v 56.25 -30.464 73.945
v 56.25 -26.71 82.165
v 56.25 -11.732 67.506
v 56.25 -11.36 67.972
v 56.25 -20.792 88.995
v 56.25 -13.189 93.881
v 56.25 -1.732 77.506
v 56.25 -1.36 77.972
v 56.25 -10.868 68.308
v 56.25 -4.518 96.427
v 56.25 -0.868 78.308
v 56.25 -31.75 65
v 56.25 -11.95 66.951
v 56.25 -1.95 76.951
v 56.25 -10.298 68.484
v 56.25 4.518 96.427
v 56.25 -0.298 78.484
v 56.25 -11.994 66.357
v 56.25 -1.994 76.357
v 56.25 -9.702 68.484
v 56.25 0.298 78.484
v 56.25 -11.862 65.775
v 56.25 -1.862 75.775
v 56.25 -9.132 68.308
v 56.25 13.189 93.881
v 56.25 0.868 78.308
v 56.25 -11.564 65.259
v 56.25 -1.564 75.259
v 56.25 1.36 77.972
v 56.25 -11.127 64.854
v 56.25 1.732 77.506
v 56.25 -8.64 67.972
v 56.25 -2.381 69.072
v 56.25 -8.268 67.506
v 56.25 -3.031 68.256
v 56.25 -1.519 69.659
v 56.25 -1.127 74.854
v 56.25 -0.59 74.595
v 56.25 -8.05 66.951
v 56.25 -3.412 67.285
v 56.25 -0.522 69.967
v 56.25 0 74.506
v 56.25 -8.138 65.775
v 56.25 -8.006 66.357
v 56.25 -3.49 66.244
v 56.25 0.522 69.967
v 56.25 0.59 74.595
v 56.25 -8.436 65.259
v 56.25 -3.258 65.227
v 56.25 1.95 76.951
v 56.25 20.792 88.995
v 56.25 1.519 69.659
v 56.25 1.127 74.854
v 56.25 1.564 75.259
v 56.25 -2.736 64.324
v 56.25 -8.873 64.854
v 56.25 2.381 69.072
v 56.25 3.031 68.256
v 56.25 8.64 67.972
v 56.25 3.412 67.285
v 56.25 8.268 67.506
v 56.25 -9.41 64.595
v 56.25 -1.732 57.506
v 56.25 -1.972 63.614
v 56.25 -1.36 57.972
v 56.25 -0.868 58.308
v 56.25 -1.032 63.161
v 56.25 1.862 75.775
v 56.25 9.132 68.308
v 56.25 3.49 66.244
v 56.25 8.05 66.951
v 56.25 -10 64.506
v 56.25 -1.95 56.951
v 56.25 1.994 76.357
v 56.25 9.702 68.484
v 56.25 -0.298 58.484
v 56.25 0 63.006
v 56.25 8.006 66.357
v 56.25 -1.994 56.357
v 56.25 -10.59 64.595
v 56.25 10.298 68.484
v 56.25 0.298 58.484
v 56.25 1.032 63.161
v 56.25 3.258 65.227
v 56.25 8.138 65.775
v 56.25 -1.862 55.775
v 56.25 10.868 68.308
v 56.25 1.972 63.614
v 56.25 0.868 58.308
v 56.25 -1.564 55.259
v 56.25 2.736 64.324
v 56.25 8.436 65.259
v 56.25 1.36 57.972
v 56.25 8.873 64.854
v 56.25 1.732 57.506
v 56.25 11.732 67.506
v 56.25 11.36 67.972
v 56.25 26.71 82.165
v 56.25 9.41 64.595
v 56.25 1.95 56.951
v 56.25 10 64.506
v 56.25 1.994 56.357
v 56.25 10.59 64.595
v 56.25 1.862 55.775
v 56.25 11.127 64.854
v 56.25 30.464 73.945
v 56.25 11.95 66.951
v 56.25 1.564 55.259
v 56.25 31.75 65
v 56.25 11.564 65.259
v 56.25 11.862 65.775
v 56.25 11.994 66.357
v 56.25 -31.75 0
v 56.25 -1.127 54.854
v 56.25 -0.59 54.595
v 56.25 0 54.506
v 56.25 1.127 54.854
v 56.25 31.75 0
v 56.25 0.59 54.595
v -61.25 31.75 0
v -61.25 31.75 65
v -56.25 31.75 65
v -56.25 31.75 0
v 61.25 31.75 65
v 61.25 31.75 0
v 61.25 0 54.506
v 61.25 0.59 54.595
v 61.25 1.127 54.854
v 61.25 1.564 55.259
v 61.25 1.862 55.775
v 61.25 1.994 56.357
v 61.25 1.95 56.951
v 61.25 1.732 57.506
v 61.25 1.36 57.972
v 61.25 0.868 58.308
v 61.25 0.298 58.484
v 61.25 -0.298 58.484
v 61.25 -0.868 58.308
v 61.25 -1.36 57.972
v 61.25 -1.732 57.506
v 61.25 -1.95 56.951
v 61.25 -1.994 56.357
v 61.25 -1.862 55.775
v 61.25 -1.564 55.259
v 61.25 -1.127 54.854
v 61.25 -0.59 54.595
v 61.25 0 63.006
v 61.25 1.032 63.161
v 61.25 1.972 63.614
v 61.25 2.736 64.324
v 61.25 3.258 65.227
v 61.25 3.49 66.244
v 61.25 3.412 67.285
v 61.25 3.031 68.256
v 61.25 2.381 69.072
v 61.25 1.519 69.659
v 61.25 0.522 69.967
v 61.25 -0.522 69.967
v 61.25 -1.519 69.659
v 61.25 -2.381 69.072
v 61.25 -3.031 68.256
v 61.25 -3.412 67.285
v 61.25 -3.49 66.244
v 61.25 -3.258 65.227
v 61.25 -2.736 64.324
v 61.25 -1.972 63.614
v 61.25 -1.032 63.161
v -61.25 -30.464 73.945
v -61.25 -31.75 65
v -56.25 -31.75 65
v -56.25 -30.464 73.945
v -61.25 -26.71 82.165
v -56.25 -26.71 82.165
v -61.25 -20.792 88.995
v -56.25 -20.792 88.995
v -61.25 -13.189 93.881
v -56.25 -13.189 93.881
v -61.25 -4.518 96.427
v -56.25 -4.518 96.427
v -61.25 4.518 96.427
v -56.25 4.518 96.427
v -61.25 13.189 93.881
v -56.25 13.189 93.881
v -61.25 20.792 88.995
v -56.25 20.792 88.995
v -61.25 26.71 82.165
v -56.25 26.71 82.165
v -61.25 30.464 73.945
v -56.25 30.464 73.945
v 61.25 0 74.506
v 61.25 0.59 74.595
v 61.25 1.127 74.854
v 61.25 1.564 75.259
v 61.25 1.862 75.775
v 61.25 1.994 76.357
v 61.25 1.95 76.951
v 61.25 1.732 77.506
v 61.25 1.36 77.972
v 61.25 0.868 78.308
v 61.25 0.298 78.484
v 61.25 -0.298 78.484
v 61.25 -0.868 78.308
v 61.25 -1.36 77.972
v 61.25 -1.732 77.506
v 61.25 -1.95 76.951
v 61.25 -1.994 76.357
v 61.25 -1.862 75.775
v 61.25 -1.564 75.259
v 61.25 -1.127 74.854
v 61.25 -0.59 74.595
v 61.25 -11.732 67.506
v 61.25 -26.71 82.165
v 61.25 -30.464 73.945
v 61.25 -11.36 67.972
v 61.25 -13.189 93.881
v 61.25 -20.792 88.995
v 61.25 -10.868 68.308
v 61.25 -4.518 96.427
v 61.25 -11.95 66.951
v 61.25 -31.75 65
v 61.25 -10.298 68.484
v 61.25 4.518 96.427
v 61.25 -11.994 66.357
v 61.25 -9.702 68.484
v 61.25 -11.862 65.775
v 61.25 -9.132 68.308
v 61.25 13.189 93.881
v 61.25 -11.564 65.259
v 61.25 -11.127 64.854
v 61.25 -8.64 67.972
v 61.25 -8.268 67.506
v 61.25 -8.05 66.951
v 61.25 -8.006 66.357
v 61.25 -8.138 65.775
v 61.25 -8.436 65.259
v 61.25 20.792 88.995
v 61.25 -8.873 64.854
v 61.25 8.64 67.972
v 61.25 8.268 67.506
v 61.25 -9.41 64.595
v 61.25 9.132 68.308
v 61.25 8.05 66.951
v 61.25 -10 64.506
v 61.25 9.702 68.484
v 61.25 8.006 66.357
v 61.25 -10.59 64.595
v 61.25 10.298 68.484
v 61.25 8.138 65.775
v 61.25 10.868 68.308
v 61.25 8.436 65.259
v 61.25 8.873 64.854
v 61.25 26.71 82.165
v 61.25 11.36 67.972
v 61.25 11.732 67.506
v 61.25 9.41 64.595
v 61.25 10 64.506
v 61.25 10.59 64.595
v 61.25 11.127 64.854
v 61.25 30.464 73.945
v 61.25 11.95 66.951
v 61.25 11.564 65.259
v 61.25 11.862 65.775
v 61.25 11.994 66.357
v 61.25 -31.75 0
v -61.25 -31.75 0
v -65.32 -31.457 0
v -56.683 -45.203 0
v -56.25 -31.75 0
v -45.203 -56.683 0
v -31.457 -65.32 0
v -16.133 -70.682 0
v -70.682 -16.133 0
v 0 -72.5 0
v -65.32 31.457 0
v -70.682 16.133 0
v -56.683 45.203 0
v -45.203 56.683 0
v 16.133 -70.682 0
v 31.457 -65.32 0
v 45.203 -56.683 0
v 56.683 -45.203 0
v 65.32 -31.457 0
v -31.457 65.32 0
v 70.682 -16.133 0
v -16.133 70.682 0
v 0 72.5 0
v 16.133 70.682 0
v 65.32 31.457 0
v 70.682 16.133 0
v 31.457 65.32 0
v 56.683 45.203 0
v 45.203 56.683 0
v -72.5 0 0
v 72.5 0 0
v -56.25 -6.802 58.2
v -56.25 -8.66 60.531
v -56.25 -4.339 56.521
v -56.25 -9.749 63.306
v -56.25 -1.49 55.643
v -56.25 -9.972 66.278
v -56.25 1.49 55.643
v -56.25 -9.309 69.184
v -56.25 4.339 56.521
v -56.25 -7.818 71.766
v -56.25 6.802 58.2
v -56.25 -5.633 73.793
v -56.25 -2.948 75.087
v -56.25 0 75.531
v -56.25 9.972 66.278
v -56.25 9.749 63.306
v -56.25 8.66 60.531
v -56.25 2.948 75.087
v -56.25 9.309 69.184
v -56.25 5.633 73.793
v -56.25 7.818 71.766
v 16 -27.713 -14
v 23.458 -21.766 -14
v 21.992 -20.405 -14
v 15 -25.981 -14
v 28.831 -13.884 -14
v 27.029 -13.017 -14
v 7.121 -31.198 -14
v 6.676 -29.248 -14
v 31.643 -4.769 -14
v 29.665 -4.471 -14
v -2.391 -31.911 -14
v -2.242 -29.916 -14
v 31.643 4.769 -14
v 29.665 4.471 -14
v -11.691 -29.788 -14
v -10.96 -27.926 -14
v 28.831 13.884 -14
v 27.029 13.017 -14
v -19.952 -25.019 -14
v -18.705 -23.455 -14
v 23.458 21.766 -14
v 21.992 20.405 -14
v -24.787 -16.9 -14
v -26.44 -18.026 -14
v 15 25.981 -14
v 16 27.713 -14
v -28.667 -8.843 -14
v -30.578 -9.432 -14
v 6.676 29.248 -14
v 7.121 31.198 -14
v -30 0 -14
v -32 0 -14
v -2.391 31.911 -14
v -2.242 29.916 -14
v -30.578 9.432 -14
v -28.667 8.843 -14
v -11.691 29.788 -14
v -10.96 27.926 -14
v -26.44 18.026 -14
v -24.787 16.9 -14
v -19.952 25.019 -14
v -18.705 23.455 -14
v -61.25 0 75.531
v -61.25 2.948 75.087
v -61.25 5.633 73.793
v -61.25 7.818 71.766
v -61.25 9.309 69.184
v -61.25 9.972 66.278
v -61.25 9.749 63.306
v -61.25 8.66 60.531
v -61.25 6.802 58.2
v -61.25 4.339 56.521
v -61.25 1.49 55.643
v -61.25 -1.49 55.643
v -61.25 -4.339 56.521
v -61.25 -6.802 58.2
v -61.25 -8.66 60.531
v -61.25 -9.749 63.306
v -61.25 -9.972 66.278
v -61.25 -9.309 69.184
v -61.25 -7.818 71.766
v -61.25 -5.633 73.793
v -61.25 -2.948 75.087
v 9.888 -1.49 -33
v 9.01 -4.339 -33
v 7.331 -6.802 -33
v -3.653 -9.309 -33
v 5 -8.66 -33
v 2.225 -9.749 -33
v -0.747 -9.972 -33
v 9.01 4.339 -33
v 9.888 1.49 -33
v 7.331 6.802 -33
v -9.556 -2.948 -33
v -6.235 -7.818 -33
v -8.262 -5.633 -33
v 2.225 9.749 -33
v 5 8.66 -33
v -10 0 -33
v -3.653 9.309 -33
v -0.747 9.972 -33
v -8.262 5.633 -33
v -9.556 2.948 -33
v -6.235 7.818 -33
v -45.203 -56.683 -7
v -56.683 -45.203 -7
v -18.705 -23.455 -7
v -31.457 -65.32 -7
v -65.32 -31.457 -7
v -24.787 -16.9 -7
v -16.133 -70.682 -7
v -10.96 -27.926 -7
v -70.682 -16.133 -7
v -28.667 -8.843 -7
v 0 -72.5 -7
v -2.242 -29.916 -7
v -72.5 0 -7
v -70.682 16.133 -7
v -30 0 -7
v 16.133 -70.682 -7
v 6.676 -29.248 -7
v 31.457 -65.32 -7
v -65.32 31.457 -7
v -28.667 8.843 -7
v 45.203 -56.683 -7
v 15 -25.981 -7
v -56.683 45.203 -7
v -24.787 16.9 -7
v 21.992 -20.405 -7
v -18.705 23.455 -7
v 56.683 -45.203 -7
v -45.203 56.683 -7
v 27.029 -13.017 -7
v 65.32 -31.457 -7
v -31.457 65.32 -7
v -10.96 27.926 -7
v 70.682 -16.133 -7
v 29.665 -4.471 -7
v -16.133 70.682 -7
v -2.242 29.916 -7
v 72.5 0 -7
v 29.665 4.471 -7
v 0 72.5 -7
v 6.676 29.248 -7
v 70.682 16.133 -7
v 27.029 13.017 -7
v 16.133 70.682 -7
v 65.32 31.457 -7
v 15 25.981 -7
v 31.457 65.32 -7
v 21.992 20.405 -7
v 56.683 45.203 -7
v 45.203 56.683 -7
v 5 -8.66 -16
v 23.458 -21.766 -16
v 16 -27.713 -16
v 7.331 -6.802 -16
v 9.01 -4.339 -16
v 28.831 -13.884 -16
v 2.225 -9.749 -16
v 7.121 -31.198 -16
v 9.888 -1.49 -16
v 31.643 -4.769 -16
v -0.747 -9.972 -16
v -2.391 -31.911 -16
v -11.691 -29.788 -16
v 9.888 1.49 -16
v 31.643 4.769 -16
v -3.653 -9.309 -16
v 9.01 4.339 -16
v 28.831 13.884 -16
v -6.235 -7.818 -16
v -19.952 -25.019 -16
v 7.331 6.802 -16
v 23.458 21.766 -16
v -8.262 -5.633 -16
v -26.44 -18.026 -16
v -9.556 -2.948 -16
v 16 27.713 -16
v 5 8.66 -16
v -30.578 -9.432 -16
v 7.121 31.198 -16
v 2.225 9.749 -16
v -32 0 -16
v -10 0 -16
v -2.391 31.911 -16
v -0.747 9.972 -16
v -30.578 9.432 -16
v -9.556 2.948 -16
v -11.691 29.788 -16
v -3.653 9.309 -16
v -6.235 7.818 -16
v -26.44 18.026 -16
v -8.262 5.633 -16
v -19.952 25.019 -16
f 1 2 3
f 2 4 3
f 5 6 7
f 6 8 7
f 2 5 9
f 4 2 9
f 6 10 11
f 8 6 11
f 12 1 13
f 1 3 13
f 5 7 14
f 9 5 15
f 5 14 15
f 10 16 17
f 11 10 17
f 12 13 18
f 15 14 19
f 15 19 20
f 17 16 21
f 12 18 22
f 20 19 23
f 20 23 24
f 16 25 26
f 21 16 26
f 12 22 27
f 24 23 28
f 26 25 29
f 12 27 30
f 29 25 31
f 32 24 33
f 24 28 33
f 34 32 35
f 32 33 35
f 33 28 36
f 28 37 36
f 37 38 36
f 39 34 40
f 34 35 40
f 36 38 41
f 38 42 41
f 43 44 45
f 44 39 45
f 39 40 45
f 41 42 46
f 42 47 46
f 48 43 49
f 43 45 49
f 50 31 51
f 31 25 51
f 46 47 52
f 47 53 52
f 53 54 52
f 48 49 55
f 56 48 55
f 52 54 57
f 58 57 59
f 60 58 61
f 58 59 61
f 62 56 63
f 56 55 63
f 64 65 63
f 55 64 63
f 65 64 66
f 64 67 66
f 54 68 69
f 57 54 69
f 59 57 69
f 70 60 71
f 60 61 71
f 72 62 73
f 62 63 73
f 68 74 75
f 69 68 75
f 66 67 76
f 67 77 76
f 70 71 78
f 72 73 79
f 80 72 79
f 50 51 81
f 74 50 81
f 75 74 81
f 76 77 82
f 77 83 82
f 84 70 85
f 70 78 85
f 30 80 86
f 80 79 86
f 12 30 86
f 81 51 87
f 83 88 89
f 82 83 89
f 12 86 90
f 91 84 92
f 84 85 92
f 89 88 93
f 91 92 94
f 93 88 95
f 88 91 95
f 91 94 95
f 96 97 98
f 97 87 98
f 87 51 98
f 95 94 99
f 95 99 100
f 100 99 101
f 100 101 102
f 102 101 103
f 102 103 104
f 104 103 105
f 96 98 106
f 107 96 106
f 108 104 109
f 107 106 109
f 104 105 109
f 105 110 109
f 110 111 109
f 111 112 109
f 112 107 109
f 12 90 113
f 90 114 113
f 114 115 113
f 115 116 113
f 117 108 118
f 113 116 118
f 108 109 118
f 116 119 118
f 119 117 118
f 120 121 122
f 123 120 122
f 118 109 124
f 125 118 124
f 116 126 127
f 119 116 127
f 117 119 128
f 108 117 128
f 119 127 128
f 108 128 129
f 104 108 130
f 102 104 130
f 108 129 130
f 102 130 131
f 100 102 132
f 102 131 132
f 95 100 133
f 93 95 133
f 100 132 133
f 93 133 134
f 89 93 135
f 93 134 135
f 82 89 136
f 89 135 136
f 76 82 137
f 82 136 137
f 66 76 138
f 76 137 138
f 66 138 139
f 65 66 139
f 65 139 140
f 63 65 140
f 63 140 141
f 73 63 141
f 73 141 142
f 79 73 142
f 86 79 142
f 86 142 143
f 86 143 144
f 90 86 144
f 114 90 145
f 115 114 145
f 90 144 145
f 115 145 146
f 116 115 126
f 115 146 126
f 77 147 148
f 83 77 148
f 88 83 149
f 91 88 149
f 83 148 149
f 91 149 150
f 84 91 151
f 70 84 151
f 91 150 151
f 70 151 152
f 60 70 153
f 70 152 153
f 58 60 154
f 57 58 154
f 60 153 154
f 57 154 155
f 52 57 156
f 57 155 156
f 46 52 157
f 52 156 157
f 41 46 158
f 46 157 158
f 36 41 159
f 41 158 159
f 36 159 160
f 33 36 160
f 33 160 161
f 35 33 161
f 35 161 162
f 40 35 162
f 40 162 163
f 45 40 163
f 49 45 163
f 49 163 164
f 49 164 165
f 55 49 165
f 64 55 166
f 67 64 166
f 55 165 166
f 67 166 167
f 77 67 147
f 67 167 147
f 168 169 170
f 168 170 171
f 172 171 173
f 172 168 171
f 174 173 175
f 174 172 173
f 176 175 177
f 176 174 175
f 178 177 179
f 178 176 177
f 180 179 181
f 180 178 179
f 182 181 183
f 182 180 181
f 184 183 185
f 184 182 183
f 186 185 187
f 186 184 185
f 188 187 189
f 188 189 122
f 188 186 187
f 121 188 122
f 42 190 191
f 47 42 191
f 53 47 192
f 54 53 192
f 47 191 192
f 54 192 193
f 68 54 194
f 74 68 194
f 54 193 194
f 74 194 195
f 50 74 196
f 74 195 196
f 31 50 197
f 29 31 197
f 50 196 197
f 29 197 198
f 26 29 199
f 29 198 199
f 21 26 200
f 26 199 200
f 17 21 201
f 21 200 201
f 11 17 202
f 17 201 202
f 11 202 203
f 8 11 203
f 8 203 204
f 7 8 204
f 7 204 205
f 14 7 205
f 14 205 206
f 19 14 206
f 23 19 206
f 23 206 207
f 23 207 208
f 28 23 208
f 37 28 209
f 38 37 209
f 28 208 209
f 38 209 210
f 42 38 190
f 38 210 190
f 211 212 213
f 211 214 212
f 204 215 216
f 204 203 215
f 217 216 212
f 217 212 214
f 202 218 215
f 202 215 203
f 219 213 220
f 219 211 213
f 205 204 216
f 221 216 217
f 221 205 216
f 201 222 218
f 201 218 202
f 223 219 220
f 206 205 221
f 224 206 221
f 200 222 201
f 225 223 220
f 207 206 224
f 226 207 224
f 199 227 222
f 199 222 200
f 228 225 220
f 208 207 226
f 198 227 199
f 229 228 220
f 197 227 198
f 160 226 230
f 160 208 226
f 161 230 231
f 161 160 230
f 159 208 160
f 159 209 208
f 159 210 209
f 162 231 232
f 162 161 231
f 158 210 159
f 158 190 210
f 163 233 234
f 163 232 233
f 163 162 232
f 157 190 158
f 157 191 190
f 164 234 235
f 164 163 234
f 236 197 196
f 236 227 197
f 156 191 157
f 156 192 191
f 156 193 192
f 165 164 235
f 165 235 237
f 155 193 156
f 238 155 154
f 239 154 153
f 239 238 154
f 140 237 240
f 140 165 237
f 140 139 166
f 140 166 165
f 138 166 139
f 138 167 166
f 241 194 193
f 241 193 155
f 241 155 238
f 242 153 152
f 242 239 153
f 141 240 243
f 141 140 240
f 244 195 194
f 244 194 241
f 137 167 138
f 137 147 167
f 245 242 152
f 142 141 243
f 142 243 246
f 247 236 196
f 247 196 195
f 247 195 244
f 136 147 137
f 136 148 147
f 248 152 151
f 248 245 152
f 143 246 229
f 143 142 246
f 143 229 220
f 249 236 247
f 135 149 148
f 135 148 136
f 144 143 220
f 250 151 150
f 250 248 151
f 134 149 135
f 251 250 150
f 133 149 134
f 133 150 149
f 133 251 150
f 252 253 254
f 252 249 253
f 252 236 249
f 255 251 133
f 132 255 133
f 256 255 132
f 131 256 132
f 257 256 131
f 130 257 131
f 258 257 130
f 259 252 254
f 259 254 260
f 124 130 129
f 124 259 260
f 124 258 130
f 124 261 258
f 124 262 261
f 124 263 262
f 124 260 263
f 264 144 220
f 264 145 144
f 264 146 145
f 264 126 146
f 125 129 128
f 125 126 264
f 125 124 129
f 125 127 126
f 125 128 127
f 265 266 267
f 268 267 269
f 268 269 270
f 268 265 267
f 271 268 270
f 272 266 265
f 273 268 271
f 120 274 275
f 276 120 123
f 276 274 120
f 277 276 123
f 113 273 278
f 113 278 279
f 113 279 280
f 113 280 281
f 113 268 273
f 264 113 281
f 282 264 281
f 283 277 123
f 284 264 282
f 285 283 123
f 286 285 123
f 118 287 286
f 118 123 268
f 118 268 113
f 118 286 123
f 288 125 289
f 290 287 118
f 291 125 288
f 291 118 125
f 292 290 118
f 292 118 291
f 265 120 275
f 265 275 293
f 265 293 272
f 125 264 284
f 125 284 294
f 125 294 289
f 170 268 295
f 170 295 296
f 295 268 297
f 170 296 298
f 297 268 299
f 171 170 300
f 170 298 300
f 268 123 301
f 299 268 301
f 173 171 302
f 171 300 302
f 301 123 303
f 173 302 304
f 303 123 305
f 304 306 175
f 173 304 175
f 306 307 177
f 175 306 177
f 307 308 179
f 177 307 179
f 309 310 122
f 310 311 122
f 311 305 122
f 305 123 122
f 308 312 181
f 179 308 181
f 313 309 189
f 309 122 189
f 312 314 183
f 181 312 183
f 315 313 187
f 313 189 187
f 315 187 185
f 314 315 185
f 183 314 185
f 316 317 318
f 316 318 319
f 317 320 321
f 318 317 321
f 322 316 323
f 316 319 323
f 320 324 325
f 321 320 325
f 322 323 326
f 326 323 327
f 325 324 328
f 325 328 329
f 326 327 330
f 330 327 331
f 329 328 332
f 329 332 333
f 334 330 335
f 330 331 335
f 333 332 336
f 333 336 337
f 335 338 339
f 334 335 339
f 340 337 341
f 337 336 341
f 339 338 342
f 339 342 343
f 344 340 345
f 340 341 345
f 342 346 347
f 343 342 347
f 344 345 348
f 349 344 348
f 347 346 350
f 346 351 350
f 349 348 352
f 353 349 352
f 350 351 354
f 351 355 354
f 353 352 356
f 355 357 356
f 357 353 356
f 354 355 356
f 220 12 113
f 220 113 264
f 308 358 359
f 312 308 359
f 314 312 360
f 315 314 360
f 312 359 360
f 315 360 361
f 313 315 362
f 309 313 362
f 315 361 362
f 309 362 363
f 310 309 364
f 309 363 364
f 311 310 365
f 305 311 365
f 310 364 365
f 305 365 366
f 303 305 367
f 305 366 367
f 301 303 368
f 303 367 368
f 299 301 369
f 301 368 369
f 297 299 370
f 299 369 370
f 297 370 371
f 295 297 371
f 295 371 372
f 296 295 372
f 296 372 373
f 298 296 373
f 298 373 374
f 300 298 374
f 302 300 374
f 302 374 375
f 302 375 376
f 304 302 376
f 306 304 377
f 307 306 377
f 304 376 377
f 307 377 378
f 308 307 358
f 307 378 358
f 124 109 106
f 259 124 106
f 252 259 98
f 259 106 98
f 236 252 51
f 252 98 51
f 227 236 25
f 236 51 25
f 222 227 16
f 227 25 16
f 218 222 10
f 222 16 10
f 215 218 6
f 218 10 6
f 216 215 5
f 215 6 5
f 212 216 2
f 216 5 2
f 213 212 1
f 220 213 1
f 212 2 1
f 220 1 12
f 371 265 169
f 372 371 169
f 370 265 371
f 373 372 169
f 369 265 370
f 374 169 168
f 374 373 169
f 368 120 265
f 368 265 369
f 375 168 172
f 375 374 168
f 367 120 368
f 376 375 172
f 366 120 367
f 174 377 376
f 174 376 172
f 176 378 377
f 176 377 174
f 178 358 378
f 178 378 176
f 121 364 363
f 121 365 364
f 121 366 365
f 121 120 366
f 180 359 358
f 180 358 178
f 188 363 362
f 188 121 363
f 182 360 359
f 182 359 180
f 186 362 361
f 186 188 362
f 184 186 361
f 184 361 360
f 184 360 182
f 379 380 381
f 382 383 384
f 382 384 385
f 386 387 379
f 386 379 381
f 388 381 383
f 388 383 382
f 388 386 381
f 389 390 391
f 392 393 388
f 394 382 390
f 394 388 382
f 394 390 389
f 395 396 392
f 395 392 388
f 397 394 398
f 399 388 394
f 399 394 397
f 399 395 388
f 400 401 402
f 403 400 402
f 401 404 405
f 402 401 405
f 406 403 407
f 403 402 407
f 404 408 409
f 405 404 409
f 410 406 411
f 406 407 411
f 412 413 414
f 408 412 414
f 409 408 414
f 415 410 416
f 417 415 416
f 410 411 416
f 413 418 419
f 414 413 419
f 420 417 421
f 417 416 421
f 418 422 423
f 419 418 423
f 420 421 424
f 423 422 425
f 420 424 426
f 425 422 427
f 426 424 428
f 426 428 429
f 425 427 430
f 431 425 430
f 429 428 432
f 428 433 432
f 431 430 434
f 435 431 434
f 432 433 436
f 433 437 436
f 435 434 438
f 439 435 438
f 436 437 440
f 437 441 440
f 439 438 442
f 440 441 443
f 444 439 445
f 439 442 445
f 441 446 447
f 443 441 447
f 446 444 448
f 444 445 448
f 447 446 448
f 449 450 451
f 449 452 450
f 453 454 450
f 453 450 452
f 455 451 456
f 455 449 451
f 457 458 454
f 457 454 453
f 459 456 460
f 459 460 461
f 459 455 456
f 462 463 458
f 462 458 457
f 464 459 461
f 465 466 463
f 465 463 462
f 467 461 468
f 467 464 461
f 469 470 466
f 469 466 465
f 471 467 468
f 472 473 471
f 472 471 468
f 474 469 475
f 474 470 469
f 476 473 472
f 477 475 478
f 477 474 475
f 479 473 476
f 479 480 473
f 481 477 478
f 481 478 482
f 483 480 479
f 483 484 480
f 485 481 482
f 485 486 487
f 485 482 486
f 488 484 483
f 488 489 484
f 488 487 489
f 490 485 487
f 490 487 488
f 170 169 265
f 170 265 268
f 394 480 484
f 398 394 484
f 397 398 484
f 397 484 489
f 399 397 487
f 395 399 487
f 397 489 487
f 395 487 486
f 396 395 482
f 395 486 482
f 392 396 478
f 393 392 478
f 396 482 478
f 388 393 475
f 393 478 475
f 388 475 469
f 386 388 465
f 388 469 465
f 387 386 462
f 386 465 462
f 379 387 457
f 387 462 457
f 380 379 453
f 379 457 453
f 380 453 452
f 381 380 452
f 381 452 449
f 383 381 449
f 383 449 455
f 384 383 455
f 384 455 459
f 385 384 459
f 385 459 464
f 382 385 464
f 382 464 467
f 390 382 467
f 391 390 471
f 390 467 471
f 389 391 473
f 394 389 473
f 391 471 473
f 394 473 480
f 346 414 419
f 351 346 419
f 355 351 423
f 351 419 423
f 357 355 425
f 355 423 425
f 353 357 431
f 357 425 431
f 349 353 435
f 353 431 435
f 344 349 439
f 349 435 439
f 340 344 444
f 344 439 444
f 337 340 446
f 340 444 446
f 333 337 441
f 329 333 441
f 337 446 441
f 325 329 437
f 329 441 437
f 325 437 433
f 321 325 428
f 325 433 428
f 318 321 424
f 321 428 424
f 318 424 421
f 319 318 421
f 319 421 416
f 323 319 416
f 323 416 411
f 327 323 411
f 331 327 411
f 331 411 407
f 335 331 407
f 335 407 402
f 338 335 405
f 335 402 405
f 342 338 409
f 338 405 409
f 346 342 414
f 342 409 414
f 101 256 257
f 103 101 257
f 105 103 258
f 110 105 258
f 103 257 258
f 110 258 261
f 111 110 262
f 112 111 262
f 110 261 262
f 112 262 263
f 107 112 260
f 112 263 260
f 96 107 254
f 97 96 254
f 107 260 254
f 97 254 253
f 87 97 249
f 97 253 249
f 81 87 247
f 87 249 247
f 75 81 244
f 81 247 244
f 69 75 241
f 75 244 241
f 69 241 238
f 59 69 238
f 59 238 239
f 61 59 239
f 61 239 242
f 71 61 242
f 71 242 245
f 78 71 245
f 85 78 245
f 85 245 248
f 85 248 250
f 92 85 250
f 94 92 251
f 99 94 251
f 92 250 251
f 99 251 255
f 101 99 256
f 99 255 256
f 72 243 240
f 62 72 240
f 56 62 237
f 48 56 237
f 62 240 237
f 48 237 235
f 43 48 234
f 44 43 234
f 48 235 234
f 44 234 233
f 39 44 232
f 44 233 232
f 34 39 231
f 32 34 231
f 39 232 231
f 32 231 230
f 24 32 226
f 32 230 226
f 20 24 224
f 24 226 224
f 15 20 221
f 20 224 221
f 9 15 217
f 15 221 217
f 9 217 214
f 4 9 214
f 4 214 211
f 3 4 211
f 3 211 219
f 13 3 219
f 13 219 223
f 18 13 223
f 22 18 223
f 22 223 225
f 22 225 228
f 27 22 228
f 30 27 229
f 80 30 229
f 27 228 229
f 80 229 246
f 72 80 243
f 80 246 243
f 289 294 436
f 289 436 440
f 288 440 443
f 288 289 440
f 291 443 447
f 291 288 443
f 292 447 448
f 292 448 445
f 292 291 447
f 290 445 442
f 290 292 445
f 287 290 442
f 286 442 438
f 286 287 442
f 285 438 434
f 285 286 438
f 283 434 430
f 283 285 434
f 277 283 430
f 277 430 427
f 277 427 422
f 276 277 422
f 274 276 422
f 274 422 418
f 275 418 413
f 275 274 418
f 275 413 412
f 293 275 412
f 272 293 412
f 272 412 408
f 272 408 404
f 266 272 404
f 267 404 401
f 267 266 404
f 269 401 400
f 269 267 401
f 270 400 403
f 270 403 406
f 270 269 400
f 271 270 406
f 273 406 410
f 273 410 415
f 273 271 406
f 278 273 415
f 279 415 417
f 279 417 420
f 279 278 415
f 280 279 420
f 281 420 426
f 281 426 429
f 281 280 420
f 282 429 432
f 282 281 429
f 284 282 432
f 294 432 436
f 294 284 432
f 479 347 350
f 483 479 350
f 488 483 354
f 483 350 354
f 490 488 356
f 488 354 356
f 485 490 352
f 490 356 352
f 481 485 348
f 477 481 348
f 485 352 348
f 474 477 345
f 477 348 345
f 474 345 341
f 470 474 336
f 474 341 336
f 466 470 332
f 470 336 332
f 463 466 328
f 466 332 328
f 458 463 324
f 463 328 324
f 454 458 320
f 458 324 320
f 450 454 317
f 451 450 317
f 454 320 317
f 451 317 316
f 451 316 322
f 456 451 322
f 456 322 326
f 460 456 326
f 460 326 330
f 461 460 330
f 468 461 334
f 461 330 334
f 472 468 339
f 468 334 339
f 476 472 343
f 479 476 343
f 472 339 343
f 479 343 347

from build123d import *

# Parameters (mm, degrees)
SKETCH1_W             = 5
SKETCH1_H             = 63.5
BOSS_EXTRUDE1_DEPTH   = 65
BOSS_EXTRUDE1_2_DEPTH = 65
SKETCH1_4_R           = 72.5
BOSS_EXTRUDE2_DEPTH   = 7
BOSS_EXTRUDE3_DEPTH   = 5
BOSS_EXTRUDE4_START   = -5
BOSS_EXTRUDE4_DEPTH   = 5
SKETCH4_R             = 30
BOSS_EXTRUDE5_DEPTH   = 7
SKETCH5_R             = 32
BOSS_EXTRUDE6_DEPTH   = 2
SKETCH6_R             = 10
BOSS_EXTRUDE7_DEPTH   = 17
SKETCH13_R            = 3.5
SKETCH13_R_2          = 2
CUT_EXTRUDE3_DEPTH    = 5
SKETCH14_R            = 10
CUT_EXTRUDE4_DEPTH    = 5


with BuildPart() as part:
    # Sketch1 → Boss-Extrude1 (new body)
    with BuildSketch(Plane.XY):
        with Locations((58.75, 0)):
            Rectangle(SKETCH1_W, SKETCH1_H)
    extrude(amount=BOSS_EXTRUDE1_DEPTH)



with BuildPart() as body_2:
    # Sketch1 → Boss-Extrude1 2 (new body)
    with BuildSketch(Plane.XY):
        with Locations((-58.75, 0)):
            Rectangle(SKETCH1_W, SKETCH1_H)
    extrude(amount=BOSS_EXTRUDE1_2_DEPTH)


with BuildPart() as part_1:
    add(part.part)

    add(body_2.part)  # Boss-Extrude2 merges body 2
    # Sketch1<4> → Boss-Extrude2 (add)
    with BuildSketch(Plane.XY):
        Circle(SKETCH1_4_R)
    extrude(amount=-BOSS_EXTRUDE2_DEPTH)

    # Sketch2 → Boss-Extrude3 (add)
    with BuildSketch(Plane.ZY.offset(-56.25)):
        with BuildLine():
            Line((65, -31.75), (65, 31.75))
            ThreePointArc((65, 31.75), (96.75, 0), (65, -31.75))
        make_face()
    extrude(amount=-BOSS_EXTRUDE3_DEPTH)

    # Sketch3 → Boss-Extrude4 (add)
    with BuildSketch(Plane(origin=(-56.25, 0, 0), x_dir=(0, 0, -1), z_dir=(1, 0, 0)).offset(BOSS_EXTRUDE4_START)):
        with BuildLine():
            Line((-65, 31.75), (-65, -31.75))
            ThreePointArc((-65, -31.75), (-96.75, 0), (-65, 31.75))
        make_face()
    extrude(amount=BOSS_EXTRUDE4_DEPTH)

    # Sketch4 → Boss-Extrude5 (add)
    with BuildSketch(Plane(origin=(0, 0, -7), x_dir=(-1, 0, 0), z_dir=(0, 0, -1))):
        Circle(SKETCH4_R)
    extrude(amount=BOSS_EXTRUDE5_DEPTH)

    # Sketch5 → Boss-Extrude6 (add)
    with BuildSketch(Plane(origin=(0, 0, -14), x_dir=(-1, 0, 0), z_dir=(0, 0, -1))):
        Circle(SKETCH5_R)
    extrude(amount=BOSS_EXTRUDE6_DEPTH)

    # Sketch6 → Boss-Extrude7 (add)
    with BuildSketch(Plane(origin=(0, 0, -16), x_dir=(-1, 0, 0), z_dir=(0, 0, -1))):
        Circle(SKETCH6_R)
    extrude(amount=BOSS_EXTRUDE7_DEPTH)

    # Sketch13 → Cut-Extrude3 (cut)
    with BuildSketch(Plane(origin=(61.25, 0, 0), x_dir=(0, 0, -1), z_dir=(1, 0, 0))):
        with Locations((-66.505993966, 0)):
            Circle(SKETCH13_R)
        with Locations((-76.505993966, 0)):
            Circle(SKETCH13_R_2)
        with Locations((-66.505993966, -10)):
            Circle(SKETCH13_R_2)
        with Locations((-56.505993966, 0)):
            Circle(SKETCH13_R_2)
        with Locations((-66.505993966, 10)):
            Circle(SKETCH13_R_2)
    extrude(amount=-CUT_EXTRUDE3_DEPTH, mode=Mode.SUBTRACT)

    # Sketch14 → Cut-Extrude4 (cut)
    with BuildSketch(Plane.ZY.offset(61.25)):
        with Locations((65.530908604, 0)):
            Circle(SKETCH14_R)
    extrude(amount=-CUT_EXTRUDE4_DEPTH, mode=Mode.SUBTRACT)


solid = part_1.part
